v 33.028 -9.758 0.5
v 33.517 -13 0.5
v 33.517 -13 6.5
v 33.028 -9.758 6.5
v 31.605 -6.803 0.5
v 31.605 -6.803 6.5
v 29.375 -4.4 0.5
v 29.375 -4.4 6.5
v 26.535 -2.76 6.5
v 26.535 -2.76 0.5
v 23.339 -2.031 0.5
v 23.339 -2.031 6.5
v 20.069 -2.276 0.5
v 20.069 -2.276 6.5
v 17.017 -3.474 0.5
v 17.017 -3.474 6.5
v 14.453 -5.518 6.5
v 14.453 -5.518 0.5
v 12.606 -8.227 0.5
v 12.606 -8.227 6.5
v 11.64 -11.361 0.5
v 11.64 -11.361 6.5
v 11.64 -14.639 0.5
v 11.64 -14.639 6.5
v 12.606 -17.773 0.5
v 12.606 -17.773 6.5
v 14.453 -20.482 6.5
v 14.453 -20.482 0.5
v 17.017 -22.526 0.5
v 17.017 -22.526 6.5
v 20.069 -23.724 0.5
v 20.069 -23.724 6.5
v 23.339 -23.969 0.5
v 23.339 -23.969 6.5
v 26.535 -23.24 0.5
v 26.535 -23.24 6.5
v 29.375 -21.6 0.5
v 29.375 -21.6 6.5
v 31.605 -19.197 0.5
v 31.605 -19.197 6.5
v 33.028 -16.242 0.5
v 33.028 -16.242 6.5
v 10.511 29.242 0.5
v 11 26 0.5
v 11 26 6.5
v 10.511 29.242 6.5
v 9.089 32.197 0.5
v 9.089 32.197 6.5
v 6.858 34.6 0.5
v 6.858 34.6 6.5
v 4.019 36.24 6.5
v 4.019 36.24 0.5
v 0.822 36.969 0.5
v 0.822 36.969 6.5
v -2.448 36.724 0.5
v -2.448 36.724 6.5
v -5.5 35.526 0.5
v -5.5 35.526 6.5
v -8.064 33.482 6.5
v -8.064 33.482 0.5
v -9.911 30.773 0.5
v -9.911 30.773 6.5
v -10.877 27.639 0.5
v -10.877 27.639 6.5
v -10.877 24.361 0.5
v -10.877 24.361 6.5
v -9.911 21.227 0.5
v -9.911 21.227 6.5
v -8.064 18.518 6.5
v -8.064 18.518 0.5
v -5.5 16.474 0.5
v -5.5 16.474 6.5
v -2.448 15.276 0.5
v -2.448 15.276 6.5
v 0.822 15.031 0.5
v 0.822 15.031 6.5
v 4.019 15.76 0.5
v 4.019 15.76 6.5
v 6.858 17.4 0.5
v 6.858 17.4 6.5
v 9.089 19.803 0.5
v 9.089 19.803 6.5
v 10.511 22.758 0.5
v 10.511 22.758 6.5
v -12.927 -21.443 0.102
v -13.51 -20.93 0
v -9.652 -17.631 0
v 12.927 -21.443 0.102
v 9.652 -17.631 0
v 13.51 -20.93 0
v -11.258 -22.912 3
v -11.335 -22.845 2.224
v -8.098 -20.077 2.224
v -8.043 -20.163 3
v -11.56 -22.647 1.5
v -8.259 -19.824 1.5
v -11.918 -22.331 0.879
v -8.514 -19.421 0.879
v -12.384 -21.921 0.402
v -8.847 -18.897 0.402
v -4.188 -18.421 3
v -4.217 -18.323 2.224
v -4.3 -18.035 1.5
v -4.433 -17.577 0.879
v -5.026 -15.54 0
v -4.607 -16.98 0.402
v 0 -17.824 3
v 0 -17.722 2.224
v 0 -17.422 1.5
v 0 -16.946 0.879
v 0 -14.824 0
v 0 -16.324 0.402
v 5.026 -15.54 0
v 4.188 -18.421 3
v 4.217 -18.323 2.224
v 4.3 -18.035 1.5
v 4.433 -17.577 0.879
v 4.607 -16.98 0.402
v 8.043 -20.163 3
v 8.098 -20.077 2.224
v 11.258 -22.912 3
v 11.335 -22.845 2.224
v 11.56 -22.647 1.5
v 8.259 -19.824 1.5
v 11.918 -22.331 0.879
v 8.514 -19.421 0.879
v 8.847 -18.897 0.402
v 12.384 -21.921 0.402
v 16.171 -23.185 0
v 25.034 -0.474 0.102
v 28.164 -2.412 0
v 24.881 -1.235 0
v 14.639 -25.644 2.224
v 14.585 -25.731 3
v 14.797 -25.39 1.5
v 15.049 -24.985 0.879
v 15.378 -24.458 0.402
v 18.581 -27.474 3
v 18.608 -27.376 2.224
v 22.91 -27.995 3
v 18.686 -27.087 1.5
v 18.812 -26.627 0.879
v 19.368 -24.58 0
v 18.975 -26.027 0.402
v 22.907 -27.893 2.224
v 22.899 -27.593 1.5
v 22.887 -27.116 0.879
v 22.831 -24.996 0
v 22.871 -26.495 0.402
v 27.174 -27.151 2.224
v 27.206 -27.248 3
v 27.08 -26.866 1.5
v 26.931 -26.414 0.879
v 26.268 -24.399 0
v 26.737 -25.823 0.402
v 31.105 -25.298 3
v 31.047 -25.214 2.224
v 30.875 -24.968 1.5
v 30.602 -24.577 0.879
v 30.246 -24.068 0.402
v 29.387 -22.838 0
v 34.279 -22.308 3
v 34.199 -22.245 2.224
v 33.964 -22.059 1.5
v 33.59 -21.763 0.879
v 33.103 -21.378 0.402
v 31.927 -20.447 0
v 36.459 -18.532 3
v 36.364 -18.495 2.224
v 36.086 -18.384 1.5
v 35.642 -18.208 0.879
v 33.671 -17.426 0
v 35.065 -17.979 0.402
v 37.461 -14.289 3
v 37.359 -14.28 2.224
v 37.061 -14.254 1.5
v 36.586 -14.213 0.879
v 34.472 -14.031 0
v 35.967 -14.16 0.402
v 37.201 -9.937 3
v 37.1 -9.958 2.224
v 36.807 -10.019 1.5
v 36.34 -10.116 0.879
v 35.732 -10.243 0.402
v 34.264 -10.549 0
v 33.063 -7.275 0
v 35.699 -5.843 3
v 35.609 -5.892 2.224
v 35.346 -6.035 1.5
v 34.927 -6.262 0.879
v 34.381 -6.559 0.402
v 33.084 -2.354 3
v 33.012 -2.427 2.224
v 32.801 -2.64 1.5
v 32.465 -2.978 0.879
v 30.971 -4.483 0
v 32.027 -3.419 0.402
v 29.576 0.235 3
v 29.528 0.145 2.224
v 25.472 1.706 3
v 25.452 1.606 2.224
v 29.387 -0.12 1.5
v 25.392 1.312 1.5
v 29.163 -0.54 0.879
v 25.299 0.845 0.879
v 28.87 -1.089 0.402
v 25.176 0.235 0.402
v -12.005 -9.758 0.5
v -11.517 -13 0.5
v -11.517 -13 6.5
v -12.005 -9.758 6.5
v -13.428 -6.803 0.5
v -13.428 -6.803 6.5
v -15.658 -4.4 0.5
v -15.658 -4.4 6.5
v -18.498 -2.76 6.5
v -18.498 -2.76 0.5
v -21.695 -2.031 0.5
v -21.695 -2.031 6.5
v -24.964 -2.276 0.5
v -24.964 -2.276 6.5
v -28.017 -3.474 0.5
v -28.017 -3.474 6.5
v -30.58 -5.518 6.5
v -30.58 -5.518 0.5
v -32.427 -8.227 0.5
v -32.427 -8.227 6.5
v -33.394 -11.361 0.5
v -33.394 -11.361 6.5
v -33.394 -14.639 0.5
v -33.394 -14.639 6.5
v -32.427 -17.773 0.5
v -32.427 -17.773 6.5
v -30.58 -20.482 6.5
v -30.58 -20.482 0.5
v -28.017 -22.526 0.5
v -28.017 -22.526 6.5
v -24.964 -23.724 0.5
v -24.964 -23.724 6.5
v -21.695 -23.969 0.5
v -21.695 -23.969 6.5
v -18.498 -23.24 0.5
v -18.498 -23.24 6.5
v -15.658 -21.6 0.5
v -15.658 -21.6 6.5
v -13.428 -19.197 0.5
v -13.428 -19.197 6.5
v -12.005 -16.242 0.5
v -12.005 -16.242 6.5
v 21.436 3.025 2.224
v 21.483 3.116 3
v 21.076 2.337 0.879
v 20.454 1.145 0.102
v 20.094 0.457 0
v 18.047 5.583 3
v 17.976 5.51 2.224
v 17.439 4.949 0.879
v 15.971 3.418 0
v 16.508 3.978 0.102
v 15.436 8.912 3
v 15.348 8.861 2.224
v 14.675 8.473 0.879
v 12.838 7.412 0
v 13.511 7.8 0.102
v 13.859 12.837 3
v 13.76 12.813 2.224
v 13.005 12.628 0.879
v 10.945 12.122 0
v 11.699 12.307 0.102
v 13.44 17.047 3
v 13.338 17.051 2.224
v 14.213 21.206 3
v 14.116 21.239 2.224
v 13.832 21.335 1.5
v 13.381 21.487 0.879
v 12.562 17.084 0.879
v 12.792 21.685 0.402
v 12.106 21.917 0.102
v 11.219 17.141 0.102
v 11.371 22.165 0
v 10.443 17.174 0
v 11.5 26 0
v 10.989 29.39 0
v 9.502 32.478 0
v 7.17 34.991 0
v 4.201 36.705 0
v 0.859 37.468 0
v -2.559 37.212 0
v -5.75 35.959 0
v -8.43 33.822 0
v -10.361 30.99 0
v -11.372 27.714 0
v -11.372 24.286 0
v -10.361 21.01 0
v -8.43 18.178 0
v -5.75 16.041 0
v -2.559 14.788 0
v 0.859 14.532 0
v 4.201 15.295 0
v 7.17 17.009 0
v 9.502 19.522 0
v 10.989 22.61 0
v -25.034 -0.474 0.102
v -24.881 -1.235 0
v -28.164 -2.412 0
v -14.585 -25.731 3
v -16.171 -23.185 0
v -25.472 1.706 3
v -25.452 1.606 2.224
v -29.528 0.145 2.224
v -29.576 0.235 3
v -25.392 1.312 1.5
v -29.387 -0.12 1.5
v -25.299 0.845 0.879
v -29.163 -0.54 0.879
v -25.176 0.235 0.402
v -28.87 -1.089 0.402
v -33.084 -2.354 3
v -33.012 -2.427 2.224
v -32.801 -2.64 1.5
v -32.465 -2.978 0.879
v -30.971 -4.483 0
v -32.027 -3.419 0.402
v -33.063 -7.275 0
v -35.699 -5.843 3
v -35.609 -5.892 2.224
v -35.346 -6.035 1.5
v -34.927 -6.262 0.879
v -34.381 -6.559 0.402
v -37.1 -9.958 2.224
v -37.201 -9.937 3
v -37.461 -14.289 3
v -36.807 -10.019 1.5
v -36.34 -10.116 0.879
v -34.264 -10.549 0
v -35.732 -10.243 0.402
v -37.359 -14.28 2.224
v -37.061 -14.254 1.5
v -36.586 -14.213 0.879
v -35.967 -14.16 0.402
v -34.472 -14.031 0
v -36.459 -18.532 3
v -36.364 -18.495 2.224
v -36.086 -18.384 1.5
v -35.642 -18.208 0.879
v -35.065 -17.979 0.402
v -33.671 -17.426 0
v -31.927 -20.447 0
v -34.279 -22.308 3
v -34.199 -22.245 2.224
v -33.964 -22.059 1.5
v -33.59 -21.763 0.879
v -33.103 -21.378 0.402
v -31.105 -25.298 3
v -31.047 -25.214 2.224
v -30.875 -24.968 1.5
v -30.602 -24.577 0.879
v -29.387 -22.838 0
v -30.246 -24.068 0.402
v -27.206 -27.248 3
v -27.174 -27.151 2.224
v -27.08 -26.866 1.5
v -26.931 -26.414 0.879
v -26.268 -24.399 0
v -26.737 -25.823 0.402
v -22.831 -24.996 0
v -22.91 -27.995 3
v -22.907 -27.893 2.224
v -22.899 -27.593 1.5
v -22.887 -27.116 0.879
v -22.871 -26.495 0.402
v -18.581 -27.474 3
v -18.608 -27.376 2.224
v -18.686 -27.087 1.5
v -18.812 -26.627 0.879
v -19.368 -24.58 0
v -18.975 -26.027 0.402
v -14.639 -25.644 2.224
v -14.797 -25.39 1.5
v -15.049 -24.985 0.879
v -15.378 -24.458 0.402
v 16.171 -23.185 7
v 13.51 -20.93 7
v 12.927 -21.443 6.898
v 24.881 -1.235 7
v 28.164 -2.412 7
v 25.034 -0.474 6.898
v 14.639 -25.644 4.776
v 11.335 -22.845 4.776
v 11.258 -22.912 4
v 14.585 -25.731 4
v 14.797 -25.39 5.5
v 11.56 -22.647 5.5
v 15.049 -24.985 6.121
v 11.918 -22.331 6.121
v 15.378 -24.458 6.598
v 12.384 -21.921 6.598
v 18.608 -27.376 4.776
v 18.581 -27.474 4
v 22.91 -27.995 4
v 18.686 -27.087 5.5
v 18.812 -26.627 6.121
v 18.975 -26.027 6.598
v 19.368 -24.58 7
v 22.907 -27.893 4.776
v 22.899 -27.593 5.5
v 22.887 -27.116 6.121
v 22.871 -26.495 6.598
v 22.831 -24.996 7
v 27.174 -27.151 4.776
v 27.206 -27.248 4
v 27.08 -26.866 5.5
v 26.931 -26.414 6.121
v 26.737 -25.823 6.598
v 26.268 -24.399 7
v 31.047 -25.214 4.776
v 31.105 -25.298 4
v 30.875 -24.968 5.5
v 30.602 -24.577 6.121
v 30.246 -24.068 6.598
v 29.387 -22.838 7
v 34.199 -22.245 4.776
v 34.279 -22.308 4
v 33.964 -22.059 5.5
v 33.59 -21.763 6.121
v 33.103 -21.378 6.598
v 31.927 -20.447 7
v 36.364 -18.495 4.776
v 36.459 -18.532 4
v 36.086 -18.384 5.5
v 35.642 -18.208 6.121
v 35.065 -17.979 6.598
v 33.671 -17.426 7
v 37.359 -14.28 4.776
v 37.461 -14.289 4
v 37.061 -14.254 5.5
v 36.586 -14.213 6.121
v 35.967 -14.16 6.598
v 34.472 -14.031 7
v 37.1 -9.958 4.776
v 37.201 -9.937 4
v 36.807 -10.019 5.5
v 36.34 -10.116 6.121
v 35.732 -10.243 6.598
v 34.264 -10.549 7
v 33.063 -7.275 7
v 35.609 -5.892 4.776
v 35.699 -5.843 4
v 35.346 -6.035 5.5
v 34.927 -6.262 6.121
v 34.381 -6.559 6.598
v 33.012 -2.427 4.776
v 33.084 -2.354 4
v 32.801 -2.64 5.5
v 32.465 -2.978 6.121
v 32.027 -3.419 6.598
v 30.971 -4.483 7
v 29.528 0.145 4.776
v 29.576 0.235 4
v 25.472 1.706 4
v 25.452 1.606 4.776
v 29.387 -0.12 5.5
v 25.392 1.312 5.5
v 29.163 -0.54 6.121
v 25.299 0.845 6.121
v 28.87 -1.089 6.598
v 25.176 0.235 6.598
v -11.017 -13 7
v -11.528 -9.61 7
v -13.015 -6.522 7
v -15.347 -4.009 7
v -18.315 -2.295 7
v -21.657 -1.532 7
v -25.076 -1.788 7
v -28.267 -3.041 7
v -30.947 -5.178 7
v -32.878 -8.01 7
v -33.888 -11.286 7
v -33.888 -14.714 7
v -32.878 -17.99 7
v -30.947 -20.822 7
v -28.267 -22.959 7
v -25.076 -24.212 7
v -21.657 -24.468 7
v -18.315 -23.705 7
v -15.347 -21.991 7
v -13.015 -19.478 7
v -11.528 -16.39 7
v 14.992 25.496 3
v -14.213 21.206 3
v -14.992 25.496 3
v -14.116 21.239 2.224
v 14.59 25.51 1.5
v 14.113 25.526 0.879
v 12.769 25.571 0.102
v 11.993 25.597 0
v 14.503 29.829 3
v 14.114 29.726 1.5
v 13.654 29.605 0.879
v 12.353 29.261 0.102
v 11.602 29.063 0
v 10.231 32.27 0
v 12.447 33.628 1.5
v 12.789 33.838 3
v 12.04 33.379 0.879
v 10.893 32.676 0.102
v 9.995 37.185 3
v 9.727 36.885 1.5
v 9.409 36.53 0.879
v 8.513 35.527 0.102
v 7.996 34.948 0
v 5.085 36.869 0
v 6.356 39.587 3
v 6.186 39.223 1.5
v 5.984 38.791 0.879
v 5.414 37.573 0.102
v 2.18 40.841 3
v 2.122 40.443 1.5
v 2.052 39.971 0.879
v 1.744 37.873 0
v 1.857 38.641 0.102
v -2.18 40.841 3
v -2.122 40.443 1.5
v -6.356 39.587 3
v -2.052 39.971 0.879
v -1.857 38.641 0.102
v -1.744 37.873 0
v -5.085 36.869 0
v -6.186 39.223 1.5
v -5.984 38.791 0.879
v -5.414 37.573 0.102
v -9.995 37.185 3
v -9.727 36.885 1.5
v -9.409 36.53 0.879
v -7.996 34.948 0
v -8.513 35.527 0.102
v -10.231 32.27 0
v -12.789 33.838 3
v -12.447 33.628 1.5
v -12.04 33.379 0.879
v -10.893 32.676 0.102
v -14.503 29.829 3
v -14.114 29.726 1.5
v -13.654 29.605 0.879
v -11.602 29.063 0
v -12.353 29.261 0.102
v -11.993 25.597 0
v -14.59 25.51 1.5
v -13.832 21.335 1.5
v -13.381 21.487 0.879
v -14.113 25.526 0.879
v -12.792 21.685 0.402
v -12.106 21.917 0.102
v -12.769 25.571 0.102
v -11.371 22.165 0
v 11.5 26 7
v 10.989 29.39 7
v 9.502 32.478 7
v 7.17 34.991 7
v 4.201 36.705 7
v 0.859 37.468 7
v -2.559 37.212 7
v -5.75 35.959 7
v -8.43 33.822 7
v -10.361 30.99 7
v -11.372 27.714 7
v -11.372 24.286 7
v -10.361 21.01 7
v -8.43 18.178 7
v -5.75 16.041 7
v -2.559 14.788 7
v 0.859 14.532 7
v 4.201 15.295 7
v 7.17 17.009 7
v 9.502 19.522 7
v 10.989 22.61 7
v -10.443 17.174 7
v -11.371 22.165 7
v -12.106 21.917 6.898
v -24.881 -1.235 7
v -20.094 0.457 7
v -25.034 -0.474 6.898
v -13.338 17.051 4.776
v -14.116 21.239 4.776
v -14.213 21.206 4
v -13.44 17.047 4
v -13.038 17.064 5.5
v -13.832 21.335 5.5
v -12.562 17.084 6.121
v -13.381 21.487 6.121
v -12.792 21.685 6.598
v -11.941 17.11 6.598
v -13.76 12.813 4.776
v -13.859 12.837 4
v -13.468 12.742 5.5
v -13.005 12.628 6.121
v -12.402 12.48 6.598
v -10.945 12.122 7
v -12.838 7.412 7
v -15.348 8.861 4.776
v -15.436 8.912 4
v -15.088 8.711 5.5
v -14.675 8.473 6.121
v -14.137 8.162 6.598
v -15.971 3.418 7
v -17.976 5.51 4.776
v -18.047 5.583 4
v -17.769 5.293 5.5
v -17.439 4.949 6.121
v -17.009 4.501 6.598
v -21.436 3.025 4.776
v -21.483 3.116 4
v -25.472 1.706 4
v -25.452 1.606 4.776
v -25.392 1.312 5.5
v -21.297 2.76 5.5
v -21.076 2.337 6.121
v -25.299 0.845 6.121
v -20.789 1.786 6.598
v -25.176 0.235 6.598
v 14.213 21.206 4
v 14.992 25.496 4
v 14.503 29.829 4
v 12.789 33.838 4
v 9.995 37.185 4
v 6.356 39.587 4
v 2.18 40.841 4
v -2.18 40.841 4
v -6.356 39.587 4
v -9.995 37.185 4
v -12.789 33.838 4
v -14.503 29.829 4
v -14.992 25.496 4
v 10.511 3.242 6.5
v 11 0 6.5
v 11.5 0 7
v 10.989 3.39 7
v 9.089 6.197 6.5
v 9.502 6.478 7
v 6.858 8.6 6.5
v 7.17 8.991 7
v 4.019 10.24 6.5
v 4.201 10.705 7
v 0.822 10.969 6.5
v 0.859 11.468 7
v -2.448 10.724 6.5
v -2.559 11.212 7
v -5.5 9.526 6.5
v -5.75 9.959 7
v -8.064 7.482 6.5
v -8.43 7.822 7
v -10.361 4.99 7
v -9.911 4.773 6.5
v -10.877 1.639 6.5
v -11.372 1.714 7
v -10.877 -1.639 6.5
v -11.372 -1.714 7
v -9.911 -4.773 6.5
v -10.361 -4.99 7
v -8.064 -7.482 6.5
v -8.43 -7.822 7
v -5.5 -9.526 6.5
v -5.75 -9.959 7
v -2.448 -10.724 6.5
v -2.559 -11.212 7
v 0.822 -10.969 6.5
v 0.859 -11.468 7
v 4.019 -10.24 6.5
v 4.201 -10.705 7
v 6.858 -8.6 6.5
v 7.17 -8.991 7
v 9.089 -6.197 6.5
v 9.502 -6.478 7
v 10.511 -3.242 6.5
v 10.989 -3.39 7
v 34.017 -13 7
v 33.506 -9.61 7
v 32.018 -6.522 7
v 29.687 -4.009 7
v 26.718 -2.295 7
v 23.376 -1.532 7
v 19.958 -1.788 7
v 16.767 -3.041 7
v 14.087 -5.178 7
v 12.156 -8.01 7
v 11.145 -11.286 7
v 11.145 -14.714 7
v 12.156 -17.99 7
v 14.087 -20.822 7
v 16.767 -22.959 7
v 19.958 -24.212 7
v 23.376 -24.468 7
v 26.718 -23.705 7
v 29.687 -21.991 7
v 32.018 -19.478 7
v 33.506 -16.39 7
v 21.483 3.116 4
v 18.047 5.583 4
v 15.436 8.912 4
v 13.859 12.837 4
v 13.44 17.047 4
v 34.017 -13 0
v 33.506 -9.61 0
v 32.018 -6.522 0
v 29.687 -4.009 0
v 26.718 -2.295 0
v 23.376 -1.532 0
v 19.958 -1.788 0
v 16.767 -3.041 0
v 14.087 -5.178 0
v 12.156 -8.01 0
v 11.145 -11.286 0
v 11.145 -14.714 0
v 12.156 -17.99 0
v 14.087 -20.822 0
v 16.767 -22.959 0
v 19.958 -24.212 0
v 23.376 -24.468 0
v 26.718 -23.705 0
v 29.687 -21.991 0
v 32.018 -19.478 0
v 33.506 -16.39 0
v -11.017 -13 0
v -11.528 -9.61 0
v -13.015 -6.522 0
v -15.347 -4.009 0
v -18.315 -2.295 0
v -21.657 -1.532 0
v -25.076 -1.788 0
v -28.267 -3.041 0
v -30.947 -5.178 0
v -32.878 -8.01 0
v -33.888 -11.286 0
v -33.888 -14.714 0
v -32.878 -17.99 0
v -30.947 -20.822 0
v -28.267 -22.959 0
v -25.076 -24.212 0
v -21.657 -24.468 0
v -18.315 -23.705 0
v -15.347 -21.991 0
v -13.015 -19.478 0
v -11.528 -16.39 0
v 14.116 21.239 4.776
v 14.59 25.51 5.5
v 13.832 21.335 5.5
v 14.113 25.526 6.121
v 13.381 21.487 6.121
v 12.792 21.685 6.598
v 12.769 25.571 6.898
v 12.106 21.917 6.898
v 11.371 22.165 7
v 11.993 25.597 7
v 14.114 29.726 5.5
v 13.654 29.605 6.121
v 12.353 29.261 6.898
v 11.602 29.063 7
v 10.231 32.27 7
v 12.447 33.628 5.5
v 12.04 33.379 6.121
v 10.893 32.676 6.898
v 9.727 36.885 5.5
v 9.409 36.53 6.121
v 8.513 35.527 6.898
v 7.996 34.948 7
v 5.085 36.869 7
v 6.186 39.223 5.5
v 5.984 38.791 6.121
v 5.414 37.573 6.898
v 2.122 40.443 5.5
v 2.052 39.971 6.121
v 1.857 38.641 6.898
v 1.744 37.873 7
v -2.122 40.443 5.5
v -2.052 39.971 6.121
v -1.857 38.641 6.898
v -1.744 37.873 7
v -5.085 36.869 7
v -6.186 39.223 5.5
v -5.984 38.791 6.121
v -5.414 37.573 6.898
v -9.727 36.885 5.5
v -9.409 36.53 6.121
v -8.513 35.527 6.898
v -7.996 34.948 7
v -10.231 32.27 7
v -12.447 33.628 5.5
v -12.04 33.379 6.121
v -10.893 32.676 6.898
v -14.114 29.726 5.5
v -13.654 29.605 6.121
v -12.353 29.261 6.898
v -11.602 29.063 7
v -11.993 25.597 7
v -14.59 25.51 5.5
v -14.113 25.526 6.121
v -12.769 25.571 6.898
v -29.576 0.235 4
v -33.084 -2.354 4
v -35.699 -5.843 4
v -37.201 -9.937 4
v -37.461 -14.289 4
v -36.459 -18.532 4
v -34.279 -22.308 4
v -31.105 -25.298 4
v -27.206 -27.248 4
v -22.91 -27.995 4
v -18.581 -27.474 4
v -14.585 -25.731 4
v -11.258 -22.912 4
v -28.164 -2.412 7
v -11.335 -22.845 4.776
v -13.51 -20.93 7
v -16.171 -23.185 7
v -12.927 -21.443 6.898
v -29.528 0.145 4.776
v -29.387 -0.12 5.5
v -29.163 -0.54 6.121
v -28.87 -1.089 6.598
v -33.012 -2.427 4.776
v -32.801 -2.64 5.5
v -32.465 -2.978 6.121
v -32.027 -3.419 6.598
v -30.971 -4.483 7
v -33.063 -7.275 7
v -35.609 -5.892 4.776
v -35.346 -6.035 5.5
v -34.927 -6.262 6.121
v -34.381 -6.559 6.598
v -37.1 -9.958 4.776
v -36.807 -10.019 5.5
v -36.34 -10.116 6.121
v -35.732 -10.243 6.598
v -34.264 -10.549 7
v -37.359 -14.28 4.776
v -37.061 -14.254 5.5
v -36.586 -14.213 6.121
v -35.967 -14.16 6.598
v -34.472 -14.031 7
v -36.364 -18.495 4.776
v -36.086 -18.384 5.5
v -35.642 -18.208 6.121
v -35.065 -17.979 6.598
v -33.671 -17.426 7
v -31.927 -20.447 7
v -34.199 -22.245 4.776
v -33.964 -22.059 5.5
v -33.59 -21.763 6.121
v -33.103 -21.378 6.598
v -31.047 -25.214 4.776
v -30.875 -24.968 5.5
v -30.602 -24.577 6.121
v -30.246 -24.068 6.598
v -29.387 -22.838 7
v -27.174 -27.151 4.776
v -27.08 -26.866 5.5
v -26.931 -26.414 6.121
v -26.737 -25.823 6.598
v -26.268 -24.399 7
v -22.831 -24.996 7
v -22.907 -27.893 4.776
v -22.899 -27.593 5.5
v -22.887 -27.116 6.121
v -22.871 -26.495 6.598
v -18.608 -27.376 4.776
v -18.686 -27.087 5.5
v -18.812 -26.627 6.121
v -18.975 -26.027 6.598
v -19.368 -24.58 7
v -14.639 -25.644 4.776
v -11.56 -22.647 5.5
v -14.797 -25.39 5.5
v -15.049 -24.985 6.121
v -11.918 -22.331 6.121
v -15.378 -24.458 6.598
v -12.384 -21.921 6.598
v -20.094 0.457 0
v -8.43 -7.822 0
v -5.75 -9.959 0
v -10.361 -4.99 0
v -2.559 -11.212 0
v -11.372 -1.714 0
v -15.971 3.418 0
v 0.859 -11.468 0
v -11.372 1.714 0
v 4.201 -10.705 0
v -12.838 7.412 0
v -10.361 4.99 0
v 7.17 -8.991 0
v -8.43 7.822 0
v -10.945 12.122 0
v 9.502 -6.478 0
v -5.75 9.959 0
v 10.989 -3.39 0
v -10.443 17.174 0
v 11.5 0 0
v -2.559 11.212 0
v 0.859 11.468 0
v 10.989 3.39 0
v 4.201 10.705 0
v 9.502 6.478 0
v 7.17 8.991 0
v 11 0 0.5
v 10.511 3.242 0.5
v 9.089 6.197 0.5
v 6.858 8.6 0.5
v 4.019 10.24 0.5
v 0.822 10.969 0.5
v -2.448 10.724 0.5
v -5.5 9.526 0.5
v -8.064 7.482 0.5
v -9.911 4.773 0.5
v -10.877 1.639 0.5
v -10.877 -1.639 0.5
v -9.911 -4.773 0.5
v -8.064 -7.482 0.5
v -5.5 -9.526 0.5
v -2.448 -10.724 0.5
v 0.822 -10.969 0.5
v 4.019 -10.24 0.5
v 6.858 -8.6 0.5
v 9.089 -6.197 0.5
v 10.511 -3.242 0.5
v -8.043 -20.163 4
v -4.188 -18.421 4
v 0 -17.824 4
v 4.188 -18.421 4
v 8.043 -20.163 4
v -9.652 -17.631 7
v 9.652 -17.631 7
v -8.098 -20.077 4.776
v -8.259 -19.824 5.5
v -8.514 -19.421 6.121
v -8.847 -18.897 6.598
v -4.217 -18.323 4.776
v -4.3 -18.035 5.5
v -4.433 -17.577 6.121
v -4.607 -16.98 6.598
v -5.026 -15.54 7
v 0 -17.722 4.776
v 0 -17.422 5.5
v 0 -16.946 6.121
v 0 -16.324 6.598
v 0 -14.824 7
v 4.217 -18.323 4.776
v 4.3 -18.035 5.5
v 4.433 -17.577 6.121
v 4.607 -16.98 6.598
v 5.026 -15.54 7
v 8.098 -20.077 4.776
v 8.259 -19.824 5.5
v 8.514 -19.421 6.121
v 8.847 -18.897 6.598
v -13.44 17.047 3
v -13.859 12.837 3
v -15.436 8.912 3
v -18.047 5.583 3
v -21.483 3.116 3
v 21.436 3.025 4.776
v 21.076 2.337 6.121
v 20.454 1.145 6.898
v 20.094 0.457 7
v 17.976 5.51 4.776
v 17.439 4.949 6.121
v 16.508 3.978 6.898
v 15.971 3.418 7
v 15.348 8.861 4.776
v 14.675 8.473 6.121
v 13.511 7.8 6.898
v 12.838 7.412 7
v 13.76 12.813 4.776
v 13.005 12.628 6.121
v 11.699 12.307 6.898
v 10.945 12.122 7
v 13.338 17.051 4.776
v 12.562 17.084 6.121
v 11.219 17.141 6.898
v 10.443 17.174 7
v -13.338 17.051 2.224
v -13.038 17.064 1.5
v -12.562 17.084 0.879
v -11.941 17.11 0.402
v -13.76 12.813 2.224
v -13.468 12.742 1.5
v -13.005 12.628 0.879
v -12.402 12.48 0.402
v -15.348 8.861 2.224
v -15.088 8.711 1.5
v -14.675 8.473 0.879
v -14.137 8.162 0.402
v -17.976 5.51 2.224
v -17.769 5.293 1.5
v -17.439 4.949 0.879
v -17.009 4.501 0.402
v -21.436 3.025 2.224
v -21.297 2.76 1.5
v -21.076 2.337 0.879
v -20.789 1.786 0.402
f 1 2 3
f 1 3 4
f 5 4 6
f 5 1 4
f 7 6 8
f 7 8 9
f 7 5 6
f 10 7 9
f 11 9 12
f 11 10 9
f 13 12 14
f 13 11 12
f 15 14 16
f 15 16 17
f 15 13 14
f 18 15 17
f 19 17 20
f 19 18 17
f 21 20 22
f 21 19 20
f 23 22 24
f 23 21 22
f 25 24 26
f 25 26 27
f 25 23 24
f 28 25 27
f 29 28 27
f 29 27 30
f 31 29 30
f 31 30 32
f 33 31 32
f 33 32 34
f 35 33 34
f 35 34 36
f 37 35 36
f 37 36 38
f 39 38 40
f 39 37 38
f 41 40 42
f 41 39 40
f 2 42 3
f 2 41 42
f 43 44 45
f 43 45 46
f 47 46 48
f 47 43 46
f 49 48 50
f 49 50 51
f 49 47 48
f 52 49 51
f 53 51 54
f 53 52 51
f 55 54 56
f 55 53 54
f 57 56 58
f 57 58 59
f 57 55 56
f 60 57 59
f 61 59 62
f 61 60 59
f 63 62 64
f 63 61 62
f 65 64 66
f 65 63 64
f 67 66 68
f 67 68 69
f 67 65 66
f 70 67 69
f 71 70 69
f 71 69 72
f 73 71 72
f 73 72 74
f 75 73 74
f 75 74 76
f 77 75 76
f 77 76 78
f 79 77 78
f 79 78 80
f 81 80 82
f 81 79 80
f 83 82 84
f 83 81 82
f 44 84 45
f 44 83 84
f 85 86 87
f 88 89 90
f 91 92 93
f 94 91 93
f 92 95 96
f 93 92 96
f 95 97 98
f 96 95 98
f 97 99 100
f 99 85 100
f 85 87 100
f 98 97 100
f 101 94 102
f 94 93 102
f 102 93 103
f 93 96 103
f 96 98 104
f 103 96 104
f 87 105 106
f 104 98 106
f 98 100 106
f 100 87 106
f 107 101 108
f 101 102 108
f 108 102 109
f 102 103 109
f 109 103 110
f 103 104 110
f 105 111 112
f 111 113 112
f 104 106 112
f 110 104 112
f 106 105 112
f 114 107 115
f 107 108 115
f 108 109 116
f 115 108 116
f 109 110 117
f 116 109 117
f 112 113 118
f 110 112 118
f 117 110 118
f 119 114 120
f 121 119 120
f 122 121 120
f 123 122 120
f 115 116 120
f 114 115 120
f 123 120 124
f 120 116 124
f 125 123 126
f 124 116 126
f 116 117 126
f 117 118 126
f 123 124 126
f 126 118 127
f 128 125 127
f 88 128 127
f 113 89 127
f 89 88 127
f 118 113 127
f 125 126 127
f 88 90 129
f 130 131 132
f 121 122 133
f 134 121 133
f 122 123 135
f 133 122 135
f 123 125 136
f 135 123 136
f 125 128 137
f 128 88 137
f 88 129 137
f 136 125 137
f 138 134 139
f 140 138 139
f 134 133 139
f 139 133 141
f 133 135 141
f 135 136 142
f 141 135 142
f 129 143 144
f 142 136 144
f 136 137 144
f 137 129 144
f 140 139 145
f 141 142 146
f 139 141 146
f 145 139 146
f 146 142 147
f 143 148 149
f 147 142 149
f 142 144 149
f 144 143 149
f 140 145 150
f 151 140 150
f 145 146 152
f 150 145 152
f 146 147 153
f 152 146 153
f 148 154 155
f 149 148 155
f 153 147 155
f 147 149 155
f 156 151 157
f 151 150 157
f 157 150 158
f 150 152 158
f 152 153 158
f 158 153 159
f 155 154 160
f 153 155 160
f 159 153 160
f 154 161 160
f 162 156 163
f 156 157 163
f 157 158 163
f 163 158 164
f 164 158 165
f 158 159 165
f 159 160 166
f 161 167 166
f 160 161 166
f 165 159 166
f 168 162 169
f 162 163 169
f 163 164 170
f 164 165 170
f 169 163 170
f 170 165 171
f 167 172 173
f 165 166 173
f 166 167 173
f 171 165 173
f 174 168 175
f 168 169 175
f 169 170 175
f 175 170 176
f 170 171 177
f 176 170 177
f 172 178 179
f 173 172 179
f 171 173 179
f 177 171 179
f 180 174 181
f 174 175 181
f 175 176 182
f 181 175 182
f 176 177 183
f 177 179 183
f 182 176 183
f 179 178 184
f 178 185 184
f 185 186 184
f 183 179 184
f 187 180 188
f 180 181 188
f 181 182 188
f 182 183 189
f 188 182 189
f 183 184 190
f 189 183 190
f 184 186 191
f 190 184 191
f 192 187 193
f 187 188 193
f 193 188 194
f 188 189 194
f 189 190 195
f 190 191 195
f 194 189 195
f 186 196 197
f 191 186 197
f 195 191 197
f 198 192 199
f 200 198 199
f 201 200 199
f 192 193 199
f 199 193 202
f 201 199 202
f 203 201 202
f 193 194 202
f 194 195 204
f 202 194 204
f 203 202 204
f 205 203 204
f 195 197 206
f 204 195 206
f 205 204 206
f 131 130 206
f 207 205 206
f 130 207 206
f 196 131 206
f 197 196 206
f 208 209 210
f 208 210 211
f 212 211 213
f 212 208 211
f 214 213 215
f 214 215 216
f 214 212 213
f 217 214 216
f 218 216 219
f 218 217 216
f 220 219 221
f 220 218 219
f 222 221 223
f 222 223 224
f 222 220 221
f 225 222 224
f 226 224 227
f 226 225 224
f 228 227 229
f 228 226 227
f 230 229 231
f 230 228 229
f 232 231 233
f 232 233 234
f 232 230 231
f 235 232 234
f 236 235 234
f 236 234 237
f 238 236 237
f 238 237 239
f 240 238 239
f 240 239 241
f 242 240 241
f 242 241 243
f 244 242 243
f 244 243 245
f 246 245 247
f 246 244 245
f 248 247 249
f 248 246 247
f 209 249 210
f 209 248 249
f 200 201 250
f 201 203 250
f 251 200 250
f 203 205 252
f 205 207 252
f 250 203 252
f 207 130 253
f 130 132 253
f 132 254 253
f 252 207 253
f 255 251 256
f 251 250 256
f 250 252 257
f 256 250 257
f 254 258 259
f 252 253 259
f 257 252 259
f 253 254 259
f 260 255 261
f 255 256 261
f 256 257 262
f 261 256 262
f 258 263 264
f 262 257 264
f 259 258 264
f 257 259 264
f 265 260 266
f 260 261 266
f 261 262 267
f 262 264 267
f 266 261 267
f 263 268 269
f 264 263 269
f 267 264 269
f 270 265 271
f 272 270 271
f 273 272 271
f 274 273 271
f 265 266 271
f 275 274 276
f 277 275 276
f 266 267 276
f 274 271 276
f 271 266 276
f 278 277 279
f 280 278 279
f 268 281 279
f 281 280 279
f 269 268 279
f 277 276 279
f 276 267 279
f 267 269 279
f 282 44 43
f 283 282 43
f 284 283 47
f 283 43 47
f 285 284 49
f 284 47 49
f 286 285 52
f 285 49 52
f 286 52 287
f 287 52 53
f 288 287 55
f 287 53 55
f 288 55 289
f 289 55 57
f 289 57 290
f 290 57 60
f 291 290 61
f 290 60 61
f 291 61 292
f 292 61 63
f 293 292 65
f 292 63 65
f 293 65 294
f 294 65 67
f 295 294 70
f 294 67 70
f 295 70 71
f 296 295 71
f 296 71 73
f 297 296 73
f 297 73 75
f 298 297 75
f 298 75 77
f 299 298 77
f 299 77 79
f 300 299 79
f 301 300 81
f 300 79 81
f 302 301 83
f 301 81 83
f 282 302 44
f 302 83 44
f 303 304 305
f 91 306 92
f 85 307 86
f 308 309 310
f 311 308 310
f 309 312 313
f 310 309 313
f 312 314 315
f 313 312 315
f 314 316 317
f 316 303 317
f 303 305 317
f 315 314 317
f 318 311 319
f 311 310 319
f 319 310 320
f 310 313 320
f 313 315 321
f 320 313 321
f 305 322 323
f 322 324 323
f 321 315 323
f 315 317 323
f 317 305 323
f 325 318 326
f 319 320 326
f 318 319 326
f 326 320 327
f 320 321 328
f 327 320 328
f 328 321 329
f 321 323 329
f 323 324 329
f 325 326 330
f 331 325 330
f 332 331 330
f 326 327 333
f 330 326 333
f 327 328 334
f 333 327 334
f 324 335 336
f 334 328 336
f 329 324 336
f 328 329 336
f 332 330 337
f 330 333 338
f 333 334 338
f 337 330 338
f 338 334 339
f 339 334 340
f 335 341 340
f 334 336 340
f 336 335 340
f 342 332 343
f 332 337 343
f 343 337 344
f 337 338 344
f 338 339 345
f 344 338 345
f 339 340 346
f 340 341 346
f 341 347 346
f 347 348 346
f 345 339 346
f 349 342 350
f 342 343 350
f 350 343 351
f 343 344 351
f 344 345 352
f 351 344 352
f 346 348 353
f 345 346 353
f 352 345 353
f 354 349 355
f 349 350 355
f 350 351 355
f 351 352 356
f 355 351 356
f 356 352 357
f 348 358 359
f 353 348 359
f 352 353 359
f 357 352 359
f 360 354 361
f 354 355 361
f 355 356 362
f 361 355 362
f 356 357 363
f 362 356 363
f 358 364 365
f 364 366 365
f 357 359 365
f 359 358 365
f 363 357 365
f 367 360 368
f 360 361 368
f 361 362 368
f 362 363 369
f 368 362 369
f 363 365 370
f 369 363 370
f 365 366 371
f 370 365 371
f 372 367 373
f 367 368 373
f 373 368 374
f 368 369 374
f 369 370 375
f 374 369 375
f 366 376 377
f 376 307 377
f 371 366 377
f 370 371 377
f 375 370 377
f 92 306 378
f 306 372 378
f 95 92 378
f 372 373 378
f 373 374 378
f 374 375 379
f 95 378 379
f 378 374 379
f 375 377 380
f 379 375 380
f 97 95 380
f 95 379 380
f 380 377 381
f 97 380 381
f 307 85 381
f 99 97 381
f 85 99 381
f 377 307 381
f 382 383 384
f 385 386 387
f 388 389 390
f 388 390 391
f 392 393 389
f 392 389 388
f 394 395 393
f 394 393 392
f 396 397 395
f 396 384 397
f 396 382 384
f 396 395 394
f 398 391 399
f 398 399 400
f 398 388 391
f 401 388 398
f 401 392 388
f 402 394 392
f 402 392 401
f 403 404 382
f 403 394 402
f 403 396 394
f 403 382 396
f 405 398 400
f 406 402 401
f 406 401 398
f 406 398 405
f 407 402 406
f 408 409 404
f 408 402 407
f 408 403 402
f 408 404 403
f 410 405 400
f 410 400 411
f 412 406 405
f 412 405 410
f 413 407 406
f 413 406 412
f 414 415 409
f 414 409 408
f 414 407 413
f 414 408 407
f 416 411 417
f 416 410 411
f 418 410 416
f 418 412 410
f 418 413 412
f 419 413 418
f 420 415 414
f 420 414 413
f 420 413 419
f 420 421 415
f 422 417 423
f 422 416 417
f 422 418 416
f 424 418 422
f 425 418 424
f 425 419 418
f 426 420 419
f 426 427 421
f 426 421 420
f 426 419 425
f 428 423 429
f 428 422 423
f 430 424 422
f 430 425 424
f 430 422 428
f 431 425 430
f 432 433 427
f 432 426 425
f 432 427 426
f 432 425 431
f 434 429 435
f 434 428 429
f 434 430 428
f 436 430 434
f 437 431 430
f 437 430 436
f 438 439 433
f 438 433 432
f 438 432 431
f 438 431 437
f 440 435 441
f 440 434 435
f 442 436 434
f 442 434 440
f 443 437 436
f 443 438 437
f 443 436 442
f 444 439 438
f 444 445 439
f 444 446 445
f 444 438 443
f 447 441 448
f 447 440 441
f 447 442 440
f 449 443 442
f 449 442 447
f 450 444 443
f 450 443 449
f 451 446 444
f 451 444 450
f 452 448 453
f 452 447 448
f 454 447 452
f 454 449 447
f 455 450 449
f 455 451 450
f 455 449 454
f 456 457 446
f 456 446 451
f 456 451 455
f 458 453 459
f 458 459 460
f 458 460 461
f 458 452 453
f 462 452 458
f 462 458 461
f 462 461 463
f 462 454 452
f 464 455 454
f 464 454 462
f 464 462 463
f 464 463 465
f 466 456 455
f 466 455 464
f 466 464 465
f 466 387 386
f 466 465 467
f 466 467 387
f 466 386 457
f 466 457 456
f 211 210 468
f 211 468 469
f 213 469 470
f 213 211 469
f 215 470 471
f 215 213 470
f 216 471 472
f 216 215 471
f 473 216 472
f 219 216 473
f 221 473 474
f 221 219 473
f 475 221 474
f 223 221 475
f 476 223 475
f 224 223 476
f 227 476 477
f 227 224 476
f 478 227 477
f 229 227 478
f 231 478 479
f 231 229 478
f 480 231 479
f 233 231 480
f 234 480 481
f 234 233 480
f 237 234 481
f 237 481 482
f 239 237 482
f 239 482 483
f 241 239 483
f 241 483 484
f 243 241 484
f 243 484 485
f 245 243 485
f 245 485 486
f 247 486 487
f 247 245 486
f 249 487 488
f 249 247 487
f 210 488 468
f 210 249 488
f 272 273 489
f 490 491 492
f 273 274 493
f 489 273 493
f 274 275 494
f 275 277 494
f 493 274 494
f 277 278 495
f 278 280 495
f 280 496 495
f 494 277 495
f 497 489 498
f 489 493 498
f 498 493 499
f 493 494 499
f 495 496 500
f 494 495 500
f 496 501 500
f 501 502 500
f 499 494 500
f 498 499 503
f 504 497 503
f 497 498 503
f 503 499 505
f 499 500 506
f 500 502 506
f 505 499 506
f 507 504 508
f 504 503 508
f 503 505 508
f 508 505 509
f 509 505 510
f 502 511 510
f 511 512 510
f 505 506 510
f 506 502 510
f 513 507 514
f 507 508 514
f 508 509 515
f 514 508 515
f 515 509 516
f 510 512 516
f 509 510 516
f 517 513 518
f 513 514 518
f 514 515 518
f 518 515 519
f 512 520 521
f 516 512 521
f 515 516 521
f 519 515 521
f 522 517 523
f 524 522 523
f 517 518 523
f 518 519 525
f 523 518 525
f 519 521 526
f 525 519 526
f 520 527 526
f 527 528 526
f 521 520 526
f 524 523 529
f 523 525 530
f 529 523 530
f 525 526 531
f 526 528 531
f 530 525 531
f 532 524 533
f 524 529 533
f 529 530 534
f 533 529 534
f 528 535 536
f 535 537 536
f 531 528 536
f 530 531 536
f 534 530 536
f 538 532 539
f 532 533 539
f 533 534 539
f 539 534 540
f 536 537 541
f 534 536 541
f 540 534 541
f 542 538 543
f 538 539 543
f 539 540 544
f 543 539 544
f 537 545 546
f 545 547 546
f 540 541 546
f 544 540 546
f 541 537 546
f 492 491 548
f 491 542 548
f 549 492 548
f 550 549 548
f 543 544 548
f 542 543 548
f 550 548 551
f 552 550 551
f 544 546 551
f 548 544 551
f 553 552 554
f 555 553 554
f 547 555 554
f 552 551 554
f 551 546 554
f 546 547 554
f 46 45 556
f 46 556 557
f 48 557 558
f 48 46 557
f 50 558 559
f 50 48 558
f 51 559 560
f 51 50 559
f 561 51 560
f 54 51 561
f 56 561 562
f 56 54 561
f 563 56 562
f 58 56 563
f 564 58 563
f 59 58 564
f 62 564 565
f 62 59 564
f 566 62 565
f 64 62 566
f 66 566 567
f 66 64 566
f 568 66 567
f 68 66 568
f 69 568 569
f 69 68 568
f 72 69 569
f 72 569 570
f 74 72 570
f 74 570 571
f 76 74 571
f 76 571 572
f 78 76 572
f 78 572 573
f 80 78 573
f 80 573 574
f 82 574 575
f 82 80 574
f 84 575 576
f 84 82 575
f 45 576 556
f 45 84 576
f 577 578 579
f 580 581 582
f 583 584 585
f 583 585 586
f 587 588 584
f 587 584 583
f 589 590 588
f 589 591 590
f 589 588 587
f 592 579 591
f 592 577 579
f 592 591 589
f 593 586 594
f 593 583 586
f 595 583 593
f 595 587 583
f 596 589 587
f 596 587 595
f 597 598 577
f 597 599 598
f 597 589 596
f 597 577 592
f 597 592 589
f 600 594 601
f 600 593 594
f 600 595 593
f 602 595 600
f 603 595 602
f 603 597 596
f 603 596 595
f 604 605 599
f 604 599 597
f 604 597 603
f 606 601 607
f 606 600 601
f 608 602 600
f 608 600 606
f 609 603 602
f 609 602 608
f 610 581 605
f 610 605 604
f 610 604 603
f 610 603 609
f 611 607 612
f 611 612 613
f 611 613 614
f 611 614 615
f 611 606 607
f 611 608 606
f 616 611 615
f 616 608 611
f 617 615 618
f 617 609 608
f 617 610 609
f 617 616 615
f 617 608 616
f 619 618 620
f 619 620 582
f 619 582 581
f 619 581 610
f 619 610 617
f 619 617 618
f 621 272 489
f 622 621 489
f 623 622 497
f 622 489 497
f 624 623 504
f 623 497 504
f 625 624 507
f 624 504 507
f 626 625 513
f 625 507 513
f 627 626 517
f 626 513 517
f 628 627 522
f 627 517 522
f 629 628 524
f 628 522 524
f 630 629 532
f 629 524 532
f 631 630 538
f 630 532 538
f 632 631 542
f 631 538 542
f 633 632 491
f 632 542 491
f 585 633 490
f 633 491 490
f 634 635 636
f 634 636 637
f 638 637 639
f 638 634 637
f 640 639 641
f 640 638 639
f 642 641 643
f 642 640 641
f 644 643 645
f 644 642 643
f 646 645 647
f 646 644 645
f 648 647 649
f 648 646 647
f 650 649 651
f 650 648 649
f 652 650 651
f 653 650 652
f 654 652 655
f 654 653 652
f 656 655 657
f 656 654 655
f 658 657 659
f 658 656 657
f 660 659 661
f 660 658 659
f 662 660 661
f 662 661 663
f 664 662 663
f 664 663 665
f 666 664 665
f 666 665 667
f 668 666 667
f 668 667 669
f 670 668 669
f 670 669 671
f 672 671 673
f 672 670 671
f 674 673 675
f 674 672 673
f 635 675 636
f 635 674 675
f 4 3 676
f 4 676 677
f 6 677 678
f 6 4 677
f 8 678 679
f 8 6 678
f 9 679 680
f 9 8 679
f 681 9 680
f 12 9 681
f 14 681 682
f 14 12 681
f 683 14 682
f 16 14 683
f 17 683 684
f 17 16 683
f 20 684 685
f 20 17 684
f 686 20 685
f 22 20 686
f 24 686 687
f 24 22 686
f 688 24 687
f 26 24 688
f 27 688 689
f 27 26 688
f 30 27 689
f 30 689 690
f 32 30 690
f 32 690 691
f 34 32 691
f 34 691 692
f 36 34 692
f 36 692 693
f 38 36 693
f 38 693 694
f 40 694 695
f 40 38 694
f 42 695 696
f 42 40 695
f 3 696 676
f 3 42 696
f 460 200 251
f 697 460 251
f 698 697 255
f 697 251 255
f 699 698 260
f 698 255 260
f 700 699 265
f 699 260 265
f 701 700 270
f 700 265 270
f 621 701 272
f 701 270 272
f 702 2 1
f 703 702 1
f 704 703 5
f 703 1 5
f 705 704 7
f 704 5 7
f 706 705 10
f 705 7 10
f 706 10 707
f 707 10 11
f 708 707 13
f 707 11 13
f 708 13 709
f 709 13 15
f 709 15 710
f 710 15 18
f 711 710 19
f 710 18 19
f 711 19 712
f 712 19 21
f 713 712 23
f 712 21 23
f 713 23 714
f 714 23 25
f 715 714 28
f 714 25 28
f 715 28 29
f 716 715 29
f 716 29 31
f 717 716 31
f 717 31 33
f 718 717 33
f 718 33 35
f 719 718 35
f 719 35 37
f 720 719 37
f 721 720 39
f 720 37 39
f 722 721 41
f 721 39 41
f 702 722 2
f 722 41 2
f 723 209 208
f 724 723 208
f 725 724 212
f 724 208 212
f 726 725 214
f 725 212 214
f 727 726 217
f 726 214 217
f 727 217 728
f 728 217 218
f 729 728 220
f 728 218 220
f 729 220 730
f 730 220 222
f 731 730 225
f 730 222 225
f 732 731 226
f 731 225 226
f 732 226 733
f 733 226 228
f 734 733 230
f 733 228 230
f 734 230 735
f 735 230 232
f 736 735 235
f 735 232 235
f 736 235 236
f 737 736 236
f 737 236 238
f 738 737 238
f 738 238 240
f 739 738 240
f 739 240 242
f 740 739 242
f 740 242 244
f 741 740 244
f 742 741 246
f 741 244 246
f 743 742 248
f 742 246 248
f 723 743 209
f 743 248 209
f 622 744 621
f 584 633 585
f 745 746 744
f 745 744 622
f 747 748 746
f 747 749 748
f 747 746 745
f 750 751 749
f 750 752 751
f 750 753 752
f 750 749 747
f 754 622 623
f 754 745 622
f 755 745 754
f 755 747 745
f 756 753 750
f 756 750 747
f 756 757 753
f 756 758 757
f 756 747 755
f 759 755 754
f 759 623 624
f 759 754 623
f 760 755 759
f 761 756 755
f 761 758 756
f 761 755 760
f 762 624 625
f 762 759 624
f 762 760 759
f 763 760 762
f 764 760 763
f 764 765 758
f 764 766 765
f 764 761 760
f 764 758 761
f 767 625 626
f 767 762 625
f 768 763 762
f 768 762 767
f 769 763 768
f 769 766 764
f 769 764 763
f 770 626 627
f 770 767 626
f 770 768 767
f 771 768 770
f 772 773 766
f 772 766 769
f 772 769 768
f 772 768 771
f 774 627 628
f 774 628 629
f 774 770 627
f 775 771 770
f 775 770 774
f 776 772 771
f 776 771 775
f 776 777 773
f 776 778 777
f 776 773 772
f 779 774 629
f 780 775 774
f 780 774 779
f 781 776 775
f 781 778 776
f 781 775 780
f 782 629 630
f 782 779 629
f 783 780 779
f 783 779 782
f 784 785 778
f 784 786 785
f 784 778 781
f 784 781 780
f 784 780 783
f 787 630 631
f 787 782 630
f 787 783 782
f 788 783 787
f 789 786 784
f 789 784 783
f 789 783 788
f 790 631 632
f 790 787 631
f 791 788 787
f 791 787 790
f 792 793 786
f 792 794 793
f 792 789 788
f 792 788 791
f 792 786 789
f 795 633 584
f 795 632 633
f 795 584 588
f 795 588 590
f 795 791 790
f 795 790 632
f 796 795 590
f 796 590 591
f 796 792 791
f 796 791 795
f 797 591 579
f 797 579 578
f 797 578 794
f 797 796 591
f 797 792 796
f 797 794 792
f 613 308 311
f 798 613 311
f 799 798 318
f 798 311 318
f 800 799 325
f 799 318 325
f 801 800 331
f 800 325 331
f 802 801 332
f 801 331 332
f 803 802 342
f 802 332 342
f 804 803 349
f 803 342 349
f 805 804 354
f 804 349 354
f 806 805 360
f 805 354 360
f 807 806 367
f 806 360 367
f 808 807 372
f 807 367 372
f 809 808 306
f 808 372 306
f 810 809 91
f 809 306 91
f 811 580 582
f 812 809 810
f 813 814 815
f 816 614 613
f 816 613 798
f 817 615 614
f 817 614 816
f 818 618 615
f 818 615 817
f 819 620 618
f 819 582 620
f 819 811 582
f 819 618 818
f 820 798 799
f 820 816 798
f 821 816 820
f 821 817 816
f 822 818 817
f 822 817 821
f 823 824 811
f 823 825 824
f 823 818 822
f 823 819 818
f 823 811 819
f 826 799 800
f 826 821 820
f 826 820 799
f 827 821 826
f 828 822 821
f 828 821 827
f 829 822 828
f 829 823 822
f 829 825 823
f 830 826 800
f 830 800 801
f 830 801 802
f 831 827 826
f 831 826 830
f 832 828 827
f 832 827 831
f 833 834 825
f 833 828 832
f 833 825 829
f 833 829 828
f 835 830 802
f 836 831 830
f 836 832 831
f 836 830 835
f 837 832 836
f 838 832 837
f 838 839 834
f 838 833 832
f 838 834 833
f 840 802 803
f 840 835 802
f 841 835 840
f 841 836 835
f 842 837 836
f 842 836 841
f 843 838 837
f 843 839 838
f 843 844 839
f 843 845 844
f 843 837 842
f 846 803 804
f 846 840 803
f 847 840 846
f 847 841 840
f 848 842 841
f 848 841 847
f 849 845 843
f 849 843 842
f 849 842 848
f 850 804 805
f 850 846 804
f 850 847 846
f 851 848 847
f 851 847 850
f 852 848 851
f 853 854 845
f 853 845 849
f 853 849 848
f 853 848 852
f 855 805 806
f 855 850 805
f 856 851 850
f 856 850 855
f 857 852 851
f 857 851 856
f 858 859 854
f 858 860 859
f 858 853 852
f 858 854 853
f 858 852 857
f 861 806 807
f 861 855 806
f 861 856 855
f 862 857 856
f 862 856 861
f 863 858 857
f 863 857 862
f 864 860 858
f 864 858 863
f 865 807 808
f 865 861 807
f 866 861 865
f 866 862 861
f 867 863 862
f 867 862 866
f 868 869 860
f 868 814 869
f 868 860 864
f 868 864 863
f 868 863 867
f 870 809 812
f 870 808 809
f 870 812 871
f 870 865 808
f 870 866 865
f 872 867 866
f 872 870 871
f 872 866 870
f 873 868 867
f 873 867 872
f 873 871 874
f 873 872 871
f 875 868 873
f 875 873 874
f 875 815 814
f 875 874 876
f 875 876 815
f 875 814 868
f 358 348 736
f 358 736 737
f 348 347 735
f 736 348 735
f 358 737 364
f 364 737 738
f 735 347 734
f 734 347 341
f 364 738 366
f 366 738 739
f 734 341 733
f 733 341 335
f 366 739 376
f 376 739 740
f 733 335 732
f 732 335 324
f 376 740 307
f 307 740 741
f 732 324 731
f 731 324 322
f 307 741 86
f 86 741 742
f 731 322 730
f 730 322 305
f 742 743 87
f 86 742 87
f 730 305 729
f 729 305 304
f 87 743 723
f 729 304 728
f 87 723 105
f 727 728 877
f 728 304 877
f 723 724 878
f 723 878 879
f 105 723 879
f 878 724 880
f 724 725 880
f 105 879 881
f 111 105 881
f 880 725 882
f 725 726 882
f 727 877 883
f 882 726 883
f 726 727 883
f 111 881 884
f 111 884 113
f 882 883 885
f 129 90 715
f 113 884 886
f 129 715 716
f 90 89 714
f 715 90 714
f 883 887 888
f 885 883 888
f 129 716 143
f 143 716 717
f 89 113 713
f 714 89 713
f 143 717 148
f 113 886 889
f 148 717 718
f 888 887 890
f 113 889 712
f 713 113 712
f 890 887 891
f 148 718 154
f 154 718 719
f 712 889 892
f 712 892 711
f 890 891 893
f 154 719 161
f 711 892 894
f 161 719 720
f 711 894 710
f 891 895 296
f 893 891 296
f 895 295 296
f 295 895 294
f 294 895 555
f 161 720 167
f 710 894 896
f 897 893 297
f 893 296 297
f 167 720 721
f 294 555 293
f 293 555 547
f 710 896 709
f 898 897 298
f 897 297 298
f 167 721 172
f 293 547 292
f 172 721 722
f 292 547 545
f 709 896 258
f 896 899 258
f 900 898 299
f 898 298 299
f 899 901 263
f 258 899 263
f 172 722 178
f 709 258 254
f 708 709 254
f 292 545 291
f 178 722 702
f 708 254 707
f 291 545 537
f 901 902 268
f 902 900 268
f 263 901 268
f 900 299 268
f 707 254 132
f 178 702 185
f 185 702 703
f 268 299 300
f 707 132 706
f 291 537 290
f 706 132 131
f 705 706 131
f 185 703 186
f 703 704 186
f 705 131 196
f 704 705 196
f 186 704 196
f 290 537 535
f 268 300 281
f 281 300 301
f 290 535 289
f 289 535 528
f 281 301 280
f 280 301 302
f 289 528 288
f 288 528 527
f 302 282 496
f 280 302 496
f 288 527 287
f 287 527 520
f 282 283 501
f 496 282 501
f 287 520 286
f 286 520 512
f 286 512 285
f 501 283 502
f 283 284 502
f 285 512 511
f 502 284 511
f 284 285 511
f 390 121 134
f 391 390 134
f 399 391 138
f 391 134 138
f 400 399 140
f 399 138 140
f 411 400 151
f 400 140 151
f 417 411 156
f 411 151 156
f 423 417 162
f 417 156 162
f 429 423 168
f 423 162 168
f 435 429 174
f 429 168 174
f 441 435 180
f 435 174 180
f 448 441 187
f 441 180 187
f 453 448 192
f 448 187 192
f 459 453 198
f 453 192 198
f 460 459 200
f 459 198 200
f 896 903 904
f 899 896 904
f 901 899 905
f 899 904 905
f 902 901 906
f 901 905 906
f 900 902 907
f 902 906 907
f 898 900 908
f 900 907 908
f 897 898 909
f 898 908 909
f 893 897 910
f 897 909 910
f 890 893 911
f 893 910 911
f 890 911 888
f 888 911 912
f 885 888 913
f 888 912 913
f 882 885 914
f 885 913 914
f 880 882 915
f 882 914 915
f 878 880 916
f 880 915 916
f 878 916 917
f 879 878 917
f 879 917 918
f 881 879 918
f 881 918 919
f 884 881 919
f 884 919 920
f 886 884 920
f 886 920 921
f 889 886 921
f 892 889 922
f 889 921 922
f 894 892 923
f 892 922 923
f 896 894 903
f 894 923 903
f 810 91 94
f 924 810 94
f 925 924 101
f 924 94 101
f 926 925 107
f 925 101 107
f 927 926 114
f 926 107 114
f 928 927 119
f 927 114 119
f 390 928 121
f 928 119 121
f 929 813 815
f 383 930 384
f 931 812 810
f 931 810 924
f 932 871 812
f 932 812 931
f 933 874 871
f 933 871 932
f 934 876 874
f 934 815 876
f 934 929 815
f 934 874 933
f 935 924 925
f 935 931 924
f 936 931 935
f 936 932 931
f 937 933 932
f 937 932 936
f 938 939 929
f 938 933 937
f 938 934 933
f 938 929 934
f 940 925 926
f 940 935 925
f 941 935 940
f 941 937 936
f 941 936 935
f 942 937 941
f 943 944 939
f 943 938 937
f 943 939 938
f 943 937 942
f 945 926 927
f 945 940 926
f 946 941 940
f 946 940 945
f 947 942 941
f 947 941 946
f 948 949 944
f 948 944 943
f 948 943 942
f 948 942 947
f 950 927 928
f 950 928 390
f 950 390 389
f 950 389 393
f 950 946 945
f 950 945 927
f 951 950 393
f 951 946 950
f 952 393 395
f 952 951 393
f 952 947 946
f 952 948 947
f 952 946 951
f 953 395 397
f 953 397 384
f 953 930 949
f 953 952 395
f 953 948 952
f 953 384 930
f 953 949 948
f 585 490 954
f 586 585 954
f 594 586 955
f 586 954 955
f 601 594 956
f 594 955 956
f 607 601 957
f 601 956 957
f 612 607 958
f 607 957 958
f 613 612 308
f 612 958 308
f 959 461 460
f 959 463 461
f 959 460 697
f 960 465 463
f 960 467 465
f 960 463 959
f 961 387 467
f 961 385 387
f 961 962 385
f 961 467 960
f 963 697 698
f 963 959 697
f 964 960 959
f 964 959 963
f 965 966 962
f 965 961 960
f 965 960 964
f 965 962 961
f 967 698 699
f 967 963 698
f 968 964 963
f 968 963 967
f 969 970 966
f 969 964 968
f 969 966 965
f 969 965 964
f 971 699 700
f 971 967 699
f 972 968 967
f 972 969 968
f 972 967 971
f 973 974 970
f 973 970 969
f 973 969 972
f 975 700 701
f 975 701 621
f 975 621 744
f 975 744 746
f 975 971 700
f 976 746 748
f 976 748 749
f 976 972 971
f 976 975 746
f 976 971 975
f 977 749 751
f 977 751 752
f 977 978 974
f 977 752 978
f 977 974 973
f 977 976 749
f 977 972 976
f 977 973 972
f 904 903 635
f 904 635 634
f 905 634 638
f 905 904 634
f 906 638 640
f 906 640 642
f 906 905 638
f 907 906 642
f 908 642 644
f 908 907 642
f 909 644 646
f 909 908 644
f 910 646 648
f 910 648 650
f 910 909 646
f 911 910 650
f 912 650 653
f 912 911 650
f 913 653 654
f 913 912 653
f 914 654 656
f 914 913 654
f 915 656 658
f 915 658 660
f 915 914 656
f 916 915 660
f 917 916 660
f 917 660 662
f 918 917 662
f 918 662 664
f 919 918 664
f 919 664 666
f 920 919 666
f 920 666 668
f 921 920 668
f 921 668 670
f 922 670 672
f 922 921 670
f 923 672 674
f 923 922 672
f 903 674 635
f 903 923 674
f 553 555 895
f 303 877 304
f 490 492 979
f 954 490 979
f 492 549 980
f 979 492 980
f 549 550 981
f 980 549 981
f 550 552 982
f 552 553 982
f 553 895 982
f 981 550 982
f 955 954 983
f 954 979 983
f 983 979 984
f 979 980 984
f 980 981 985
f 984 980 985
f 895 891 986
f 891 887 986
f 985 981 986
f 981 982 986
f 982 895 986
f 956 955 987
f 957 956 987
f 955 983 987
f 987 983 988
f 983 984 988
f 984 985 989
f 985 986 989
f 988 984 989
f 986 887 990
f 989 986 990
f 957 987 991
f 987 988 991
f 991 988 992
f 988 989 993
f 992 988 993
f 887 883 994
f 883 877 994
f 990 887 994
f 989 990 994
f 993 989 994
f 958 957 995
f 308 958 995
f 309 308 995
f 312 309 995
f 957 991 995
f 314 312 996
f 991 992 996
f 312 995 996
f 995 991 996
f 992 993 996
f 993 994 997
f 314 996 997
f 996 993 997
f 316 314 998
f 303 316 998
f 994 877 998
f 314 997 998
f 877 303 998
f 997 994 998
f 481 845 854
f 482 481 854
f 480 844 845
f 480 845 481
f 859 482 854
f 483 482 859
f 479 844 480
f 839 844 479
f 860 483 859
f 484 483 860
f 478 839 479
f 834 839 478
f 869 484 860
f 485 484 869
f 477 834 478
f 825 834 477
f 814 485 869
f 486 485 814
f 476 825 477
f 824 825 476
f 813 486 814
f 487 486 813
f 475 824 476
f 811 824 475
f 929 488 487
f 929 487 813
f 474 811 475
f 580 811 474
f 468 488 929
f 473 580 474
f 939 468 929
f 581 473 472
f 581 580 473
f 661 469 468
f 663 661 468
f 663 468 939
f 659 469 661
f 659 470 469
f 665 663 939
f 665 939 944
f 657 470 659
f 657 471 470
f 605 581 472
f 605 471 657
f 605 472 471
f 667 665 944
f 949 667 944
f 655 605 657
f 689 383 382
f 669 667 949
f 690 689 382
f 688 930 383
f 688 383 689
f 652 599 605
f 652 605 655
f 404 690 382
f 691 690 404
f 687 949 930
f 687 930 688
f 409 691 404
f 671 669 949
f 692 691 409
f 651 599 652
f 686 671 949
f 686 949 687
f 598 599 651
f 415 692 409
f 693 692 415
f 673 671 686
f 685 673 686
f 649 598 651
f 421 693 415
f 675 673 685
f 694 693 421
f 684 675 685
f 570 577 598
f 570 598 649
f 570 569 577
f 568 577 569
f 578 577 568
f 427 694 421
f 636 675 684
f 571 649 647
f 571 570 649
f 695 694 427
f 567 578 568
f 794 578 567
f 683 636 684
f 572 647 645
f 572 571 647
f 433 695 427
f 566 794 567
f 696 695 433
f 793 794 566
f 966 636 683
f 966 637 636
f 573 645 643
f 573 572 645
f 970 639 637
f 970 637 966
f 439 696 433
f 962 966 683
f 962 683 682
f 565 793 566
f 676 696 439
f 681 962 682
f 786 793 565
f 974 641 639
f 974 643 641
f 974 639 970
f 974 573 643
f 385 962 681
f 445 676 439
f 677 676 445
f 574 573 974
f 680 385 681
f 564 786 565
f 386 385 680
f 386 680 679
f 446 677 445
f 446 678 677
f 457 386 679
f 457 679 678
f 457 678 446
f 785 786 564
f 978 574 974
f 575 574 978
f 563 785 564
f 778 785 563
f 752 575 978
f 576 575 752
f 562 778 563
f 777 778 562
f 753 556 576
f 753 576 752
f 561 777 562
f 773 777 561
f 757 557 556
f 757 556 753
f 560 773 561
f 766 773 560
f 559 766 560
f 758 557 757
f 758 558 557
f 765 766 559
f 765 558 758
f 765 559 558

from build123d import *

# Parameters (mm, degrees)
F0_R     = 11
F1_DEPTH = 7
F2_R     = 3
F3_SIZE  = 0.5


with BuildPart() as f1:
    # F0 (on Top) → F1 (new body)
    with BuildSketch(Plane.XY):
        with BuildLine():
            ThreePointArc((14.2133074813, 21.2060569004), (0, 41), (-14.2133074813, 21.2060569004))
            ThreePointArc((-14.2133074813, 21.2060569004), (-15.4362339058, 8.9121138008), (-25.4716377305, 1.7060569004))
            ThreePointArc((-25.4716377305, 1.7060569004), (-35.5070415552, -20.5), (-11.2583302492, -22.9121138008))
            ThreePointArc((-11.2583302492, -22.9121138008), (0, -17.8242276016), (11.2583302492, -22.9121138008))
            ThreePointArc((11.2583302492, -22.9121138008), (35.5070415552, -20.5), (25.4716377305, 1.7060569004))
            ThreePointArc((25.4716377305, 1.7060569004), (15.4362339058, 8.9121138008), (14.2133074813, 21.2060569004))
        make_face()
        with Locations((-22.5166604984, -13)):
            Circle(F0_R, mode=Mode.SUBTRACT)
        with Locations((22.5166604984, -13)):
            Circle(F0_R, mode=Mode.SUBTRACT)
        Circle(F0_R, mode=Mode.SUBTRACT)
        with Locations((0, 26)):
            Circle(F0_R, mode=Mode.SUBTRACT)
    extrude(amount=F1_DEPTH)

    # F2
    f2_edges = [f1.edges().sort_by_distance(p)[0] for p in [
        (0, 41, 7),
        (0, 41, 0),
    ]]
    fillet(f2_edges, radius=F2_R)

    # F3
    f3_edges = [f1.edges().sort_by_distance(p)[0] for p in [
        (0, 38, 0),
        (12.838158, 7.412114, 0),
        (-12.838158, 7.412114, 0),
        (32.908965, -19, 0),
        (-32.908965, -19, 0),
        (0, -14.824228, 0),
        (-33.51666, -13, 0),
        (11.51666, -13, 0),
        (-11, 0, 0),
        (-11, 26, 0),
        (0, 38, 7),
        (12.838158, 7.412114, 7),
        (-12.838158, 7.412114, 7),
        (32.908965, -19, 7),
        (-32.908965, -19, 7),
        (0, -14.824228, 7),
        (-33.51666, -13, 7),
        (11.51666, -13, 7),
        (-11, 0, 7),
        (-11, 26, 7),
    ]]
    chamfer(f3_edges, length=F3_SIZE)


solid = f1.part
